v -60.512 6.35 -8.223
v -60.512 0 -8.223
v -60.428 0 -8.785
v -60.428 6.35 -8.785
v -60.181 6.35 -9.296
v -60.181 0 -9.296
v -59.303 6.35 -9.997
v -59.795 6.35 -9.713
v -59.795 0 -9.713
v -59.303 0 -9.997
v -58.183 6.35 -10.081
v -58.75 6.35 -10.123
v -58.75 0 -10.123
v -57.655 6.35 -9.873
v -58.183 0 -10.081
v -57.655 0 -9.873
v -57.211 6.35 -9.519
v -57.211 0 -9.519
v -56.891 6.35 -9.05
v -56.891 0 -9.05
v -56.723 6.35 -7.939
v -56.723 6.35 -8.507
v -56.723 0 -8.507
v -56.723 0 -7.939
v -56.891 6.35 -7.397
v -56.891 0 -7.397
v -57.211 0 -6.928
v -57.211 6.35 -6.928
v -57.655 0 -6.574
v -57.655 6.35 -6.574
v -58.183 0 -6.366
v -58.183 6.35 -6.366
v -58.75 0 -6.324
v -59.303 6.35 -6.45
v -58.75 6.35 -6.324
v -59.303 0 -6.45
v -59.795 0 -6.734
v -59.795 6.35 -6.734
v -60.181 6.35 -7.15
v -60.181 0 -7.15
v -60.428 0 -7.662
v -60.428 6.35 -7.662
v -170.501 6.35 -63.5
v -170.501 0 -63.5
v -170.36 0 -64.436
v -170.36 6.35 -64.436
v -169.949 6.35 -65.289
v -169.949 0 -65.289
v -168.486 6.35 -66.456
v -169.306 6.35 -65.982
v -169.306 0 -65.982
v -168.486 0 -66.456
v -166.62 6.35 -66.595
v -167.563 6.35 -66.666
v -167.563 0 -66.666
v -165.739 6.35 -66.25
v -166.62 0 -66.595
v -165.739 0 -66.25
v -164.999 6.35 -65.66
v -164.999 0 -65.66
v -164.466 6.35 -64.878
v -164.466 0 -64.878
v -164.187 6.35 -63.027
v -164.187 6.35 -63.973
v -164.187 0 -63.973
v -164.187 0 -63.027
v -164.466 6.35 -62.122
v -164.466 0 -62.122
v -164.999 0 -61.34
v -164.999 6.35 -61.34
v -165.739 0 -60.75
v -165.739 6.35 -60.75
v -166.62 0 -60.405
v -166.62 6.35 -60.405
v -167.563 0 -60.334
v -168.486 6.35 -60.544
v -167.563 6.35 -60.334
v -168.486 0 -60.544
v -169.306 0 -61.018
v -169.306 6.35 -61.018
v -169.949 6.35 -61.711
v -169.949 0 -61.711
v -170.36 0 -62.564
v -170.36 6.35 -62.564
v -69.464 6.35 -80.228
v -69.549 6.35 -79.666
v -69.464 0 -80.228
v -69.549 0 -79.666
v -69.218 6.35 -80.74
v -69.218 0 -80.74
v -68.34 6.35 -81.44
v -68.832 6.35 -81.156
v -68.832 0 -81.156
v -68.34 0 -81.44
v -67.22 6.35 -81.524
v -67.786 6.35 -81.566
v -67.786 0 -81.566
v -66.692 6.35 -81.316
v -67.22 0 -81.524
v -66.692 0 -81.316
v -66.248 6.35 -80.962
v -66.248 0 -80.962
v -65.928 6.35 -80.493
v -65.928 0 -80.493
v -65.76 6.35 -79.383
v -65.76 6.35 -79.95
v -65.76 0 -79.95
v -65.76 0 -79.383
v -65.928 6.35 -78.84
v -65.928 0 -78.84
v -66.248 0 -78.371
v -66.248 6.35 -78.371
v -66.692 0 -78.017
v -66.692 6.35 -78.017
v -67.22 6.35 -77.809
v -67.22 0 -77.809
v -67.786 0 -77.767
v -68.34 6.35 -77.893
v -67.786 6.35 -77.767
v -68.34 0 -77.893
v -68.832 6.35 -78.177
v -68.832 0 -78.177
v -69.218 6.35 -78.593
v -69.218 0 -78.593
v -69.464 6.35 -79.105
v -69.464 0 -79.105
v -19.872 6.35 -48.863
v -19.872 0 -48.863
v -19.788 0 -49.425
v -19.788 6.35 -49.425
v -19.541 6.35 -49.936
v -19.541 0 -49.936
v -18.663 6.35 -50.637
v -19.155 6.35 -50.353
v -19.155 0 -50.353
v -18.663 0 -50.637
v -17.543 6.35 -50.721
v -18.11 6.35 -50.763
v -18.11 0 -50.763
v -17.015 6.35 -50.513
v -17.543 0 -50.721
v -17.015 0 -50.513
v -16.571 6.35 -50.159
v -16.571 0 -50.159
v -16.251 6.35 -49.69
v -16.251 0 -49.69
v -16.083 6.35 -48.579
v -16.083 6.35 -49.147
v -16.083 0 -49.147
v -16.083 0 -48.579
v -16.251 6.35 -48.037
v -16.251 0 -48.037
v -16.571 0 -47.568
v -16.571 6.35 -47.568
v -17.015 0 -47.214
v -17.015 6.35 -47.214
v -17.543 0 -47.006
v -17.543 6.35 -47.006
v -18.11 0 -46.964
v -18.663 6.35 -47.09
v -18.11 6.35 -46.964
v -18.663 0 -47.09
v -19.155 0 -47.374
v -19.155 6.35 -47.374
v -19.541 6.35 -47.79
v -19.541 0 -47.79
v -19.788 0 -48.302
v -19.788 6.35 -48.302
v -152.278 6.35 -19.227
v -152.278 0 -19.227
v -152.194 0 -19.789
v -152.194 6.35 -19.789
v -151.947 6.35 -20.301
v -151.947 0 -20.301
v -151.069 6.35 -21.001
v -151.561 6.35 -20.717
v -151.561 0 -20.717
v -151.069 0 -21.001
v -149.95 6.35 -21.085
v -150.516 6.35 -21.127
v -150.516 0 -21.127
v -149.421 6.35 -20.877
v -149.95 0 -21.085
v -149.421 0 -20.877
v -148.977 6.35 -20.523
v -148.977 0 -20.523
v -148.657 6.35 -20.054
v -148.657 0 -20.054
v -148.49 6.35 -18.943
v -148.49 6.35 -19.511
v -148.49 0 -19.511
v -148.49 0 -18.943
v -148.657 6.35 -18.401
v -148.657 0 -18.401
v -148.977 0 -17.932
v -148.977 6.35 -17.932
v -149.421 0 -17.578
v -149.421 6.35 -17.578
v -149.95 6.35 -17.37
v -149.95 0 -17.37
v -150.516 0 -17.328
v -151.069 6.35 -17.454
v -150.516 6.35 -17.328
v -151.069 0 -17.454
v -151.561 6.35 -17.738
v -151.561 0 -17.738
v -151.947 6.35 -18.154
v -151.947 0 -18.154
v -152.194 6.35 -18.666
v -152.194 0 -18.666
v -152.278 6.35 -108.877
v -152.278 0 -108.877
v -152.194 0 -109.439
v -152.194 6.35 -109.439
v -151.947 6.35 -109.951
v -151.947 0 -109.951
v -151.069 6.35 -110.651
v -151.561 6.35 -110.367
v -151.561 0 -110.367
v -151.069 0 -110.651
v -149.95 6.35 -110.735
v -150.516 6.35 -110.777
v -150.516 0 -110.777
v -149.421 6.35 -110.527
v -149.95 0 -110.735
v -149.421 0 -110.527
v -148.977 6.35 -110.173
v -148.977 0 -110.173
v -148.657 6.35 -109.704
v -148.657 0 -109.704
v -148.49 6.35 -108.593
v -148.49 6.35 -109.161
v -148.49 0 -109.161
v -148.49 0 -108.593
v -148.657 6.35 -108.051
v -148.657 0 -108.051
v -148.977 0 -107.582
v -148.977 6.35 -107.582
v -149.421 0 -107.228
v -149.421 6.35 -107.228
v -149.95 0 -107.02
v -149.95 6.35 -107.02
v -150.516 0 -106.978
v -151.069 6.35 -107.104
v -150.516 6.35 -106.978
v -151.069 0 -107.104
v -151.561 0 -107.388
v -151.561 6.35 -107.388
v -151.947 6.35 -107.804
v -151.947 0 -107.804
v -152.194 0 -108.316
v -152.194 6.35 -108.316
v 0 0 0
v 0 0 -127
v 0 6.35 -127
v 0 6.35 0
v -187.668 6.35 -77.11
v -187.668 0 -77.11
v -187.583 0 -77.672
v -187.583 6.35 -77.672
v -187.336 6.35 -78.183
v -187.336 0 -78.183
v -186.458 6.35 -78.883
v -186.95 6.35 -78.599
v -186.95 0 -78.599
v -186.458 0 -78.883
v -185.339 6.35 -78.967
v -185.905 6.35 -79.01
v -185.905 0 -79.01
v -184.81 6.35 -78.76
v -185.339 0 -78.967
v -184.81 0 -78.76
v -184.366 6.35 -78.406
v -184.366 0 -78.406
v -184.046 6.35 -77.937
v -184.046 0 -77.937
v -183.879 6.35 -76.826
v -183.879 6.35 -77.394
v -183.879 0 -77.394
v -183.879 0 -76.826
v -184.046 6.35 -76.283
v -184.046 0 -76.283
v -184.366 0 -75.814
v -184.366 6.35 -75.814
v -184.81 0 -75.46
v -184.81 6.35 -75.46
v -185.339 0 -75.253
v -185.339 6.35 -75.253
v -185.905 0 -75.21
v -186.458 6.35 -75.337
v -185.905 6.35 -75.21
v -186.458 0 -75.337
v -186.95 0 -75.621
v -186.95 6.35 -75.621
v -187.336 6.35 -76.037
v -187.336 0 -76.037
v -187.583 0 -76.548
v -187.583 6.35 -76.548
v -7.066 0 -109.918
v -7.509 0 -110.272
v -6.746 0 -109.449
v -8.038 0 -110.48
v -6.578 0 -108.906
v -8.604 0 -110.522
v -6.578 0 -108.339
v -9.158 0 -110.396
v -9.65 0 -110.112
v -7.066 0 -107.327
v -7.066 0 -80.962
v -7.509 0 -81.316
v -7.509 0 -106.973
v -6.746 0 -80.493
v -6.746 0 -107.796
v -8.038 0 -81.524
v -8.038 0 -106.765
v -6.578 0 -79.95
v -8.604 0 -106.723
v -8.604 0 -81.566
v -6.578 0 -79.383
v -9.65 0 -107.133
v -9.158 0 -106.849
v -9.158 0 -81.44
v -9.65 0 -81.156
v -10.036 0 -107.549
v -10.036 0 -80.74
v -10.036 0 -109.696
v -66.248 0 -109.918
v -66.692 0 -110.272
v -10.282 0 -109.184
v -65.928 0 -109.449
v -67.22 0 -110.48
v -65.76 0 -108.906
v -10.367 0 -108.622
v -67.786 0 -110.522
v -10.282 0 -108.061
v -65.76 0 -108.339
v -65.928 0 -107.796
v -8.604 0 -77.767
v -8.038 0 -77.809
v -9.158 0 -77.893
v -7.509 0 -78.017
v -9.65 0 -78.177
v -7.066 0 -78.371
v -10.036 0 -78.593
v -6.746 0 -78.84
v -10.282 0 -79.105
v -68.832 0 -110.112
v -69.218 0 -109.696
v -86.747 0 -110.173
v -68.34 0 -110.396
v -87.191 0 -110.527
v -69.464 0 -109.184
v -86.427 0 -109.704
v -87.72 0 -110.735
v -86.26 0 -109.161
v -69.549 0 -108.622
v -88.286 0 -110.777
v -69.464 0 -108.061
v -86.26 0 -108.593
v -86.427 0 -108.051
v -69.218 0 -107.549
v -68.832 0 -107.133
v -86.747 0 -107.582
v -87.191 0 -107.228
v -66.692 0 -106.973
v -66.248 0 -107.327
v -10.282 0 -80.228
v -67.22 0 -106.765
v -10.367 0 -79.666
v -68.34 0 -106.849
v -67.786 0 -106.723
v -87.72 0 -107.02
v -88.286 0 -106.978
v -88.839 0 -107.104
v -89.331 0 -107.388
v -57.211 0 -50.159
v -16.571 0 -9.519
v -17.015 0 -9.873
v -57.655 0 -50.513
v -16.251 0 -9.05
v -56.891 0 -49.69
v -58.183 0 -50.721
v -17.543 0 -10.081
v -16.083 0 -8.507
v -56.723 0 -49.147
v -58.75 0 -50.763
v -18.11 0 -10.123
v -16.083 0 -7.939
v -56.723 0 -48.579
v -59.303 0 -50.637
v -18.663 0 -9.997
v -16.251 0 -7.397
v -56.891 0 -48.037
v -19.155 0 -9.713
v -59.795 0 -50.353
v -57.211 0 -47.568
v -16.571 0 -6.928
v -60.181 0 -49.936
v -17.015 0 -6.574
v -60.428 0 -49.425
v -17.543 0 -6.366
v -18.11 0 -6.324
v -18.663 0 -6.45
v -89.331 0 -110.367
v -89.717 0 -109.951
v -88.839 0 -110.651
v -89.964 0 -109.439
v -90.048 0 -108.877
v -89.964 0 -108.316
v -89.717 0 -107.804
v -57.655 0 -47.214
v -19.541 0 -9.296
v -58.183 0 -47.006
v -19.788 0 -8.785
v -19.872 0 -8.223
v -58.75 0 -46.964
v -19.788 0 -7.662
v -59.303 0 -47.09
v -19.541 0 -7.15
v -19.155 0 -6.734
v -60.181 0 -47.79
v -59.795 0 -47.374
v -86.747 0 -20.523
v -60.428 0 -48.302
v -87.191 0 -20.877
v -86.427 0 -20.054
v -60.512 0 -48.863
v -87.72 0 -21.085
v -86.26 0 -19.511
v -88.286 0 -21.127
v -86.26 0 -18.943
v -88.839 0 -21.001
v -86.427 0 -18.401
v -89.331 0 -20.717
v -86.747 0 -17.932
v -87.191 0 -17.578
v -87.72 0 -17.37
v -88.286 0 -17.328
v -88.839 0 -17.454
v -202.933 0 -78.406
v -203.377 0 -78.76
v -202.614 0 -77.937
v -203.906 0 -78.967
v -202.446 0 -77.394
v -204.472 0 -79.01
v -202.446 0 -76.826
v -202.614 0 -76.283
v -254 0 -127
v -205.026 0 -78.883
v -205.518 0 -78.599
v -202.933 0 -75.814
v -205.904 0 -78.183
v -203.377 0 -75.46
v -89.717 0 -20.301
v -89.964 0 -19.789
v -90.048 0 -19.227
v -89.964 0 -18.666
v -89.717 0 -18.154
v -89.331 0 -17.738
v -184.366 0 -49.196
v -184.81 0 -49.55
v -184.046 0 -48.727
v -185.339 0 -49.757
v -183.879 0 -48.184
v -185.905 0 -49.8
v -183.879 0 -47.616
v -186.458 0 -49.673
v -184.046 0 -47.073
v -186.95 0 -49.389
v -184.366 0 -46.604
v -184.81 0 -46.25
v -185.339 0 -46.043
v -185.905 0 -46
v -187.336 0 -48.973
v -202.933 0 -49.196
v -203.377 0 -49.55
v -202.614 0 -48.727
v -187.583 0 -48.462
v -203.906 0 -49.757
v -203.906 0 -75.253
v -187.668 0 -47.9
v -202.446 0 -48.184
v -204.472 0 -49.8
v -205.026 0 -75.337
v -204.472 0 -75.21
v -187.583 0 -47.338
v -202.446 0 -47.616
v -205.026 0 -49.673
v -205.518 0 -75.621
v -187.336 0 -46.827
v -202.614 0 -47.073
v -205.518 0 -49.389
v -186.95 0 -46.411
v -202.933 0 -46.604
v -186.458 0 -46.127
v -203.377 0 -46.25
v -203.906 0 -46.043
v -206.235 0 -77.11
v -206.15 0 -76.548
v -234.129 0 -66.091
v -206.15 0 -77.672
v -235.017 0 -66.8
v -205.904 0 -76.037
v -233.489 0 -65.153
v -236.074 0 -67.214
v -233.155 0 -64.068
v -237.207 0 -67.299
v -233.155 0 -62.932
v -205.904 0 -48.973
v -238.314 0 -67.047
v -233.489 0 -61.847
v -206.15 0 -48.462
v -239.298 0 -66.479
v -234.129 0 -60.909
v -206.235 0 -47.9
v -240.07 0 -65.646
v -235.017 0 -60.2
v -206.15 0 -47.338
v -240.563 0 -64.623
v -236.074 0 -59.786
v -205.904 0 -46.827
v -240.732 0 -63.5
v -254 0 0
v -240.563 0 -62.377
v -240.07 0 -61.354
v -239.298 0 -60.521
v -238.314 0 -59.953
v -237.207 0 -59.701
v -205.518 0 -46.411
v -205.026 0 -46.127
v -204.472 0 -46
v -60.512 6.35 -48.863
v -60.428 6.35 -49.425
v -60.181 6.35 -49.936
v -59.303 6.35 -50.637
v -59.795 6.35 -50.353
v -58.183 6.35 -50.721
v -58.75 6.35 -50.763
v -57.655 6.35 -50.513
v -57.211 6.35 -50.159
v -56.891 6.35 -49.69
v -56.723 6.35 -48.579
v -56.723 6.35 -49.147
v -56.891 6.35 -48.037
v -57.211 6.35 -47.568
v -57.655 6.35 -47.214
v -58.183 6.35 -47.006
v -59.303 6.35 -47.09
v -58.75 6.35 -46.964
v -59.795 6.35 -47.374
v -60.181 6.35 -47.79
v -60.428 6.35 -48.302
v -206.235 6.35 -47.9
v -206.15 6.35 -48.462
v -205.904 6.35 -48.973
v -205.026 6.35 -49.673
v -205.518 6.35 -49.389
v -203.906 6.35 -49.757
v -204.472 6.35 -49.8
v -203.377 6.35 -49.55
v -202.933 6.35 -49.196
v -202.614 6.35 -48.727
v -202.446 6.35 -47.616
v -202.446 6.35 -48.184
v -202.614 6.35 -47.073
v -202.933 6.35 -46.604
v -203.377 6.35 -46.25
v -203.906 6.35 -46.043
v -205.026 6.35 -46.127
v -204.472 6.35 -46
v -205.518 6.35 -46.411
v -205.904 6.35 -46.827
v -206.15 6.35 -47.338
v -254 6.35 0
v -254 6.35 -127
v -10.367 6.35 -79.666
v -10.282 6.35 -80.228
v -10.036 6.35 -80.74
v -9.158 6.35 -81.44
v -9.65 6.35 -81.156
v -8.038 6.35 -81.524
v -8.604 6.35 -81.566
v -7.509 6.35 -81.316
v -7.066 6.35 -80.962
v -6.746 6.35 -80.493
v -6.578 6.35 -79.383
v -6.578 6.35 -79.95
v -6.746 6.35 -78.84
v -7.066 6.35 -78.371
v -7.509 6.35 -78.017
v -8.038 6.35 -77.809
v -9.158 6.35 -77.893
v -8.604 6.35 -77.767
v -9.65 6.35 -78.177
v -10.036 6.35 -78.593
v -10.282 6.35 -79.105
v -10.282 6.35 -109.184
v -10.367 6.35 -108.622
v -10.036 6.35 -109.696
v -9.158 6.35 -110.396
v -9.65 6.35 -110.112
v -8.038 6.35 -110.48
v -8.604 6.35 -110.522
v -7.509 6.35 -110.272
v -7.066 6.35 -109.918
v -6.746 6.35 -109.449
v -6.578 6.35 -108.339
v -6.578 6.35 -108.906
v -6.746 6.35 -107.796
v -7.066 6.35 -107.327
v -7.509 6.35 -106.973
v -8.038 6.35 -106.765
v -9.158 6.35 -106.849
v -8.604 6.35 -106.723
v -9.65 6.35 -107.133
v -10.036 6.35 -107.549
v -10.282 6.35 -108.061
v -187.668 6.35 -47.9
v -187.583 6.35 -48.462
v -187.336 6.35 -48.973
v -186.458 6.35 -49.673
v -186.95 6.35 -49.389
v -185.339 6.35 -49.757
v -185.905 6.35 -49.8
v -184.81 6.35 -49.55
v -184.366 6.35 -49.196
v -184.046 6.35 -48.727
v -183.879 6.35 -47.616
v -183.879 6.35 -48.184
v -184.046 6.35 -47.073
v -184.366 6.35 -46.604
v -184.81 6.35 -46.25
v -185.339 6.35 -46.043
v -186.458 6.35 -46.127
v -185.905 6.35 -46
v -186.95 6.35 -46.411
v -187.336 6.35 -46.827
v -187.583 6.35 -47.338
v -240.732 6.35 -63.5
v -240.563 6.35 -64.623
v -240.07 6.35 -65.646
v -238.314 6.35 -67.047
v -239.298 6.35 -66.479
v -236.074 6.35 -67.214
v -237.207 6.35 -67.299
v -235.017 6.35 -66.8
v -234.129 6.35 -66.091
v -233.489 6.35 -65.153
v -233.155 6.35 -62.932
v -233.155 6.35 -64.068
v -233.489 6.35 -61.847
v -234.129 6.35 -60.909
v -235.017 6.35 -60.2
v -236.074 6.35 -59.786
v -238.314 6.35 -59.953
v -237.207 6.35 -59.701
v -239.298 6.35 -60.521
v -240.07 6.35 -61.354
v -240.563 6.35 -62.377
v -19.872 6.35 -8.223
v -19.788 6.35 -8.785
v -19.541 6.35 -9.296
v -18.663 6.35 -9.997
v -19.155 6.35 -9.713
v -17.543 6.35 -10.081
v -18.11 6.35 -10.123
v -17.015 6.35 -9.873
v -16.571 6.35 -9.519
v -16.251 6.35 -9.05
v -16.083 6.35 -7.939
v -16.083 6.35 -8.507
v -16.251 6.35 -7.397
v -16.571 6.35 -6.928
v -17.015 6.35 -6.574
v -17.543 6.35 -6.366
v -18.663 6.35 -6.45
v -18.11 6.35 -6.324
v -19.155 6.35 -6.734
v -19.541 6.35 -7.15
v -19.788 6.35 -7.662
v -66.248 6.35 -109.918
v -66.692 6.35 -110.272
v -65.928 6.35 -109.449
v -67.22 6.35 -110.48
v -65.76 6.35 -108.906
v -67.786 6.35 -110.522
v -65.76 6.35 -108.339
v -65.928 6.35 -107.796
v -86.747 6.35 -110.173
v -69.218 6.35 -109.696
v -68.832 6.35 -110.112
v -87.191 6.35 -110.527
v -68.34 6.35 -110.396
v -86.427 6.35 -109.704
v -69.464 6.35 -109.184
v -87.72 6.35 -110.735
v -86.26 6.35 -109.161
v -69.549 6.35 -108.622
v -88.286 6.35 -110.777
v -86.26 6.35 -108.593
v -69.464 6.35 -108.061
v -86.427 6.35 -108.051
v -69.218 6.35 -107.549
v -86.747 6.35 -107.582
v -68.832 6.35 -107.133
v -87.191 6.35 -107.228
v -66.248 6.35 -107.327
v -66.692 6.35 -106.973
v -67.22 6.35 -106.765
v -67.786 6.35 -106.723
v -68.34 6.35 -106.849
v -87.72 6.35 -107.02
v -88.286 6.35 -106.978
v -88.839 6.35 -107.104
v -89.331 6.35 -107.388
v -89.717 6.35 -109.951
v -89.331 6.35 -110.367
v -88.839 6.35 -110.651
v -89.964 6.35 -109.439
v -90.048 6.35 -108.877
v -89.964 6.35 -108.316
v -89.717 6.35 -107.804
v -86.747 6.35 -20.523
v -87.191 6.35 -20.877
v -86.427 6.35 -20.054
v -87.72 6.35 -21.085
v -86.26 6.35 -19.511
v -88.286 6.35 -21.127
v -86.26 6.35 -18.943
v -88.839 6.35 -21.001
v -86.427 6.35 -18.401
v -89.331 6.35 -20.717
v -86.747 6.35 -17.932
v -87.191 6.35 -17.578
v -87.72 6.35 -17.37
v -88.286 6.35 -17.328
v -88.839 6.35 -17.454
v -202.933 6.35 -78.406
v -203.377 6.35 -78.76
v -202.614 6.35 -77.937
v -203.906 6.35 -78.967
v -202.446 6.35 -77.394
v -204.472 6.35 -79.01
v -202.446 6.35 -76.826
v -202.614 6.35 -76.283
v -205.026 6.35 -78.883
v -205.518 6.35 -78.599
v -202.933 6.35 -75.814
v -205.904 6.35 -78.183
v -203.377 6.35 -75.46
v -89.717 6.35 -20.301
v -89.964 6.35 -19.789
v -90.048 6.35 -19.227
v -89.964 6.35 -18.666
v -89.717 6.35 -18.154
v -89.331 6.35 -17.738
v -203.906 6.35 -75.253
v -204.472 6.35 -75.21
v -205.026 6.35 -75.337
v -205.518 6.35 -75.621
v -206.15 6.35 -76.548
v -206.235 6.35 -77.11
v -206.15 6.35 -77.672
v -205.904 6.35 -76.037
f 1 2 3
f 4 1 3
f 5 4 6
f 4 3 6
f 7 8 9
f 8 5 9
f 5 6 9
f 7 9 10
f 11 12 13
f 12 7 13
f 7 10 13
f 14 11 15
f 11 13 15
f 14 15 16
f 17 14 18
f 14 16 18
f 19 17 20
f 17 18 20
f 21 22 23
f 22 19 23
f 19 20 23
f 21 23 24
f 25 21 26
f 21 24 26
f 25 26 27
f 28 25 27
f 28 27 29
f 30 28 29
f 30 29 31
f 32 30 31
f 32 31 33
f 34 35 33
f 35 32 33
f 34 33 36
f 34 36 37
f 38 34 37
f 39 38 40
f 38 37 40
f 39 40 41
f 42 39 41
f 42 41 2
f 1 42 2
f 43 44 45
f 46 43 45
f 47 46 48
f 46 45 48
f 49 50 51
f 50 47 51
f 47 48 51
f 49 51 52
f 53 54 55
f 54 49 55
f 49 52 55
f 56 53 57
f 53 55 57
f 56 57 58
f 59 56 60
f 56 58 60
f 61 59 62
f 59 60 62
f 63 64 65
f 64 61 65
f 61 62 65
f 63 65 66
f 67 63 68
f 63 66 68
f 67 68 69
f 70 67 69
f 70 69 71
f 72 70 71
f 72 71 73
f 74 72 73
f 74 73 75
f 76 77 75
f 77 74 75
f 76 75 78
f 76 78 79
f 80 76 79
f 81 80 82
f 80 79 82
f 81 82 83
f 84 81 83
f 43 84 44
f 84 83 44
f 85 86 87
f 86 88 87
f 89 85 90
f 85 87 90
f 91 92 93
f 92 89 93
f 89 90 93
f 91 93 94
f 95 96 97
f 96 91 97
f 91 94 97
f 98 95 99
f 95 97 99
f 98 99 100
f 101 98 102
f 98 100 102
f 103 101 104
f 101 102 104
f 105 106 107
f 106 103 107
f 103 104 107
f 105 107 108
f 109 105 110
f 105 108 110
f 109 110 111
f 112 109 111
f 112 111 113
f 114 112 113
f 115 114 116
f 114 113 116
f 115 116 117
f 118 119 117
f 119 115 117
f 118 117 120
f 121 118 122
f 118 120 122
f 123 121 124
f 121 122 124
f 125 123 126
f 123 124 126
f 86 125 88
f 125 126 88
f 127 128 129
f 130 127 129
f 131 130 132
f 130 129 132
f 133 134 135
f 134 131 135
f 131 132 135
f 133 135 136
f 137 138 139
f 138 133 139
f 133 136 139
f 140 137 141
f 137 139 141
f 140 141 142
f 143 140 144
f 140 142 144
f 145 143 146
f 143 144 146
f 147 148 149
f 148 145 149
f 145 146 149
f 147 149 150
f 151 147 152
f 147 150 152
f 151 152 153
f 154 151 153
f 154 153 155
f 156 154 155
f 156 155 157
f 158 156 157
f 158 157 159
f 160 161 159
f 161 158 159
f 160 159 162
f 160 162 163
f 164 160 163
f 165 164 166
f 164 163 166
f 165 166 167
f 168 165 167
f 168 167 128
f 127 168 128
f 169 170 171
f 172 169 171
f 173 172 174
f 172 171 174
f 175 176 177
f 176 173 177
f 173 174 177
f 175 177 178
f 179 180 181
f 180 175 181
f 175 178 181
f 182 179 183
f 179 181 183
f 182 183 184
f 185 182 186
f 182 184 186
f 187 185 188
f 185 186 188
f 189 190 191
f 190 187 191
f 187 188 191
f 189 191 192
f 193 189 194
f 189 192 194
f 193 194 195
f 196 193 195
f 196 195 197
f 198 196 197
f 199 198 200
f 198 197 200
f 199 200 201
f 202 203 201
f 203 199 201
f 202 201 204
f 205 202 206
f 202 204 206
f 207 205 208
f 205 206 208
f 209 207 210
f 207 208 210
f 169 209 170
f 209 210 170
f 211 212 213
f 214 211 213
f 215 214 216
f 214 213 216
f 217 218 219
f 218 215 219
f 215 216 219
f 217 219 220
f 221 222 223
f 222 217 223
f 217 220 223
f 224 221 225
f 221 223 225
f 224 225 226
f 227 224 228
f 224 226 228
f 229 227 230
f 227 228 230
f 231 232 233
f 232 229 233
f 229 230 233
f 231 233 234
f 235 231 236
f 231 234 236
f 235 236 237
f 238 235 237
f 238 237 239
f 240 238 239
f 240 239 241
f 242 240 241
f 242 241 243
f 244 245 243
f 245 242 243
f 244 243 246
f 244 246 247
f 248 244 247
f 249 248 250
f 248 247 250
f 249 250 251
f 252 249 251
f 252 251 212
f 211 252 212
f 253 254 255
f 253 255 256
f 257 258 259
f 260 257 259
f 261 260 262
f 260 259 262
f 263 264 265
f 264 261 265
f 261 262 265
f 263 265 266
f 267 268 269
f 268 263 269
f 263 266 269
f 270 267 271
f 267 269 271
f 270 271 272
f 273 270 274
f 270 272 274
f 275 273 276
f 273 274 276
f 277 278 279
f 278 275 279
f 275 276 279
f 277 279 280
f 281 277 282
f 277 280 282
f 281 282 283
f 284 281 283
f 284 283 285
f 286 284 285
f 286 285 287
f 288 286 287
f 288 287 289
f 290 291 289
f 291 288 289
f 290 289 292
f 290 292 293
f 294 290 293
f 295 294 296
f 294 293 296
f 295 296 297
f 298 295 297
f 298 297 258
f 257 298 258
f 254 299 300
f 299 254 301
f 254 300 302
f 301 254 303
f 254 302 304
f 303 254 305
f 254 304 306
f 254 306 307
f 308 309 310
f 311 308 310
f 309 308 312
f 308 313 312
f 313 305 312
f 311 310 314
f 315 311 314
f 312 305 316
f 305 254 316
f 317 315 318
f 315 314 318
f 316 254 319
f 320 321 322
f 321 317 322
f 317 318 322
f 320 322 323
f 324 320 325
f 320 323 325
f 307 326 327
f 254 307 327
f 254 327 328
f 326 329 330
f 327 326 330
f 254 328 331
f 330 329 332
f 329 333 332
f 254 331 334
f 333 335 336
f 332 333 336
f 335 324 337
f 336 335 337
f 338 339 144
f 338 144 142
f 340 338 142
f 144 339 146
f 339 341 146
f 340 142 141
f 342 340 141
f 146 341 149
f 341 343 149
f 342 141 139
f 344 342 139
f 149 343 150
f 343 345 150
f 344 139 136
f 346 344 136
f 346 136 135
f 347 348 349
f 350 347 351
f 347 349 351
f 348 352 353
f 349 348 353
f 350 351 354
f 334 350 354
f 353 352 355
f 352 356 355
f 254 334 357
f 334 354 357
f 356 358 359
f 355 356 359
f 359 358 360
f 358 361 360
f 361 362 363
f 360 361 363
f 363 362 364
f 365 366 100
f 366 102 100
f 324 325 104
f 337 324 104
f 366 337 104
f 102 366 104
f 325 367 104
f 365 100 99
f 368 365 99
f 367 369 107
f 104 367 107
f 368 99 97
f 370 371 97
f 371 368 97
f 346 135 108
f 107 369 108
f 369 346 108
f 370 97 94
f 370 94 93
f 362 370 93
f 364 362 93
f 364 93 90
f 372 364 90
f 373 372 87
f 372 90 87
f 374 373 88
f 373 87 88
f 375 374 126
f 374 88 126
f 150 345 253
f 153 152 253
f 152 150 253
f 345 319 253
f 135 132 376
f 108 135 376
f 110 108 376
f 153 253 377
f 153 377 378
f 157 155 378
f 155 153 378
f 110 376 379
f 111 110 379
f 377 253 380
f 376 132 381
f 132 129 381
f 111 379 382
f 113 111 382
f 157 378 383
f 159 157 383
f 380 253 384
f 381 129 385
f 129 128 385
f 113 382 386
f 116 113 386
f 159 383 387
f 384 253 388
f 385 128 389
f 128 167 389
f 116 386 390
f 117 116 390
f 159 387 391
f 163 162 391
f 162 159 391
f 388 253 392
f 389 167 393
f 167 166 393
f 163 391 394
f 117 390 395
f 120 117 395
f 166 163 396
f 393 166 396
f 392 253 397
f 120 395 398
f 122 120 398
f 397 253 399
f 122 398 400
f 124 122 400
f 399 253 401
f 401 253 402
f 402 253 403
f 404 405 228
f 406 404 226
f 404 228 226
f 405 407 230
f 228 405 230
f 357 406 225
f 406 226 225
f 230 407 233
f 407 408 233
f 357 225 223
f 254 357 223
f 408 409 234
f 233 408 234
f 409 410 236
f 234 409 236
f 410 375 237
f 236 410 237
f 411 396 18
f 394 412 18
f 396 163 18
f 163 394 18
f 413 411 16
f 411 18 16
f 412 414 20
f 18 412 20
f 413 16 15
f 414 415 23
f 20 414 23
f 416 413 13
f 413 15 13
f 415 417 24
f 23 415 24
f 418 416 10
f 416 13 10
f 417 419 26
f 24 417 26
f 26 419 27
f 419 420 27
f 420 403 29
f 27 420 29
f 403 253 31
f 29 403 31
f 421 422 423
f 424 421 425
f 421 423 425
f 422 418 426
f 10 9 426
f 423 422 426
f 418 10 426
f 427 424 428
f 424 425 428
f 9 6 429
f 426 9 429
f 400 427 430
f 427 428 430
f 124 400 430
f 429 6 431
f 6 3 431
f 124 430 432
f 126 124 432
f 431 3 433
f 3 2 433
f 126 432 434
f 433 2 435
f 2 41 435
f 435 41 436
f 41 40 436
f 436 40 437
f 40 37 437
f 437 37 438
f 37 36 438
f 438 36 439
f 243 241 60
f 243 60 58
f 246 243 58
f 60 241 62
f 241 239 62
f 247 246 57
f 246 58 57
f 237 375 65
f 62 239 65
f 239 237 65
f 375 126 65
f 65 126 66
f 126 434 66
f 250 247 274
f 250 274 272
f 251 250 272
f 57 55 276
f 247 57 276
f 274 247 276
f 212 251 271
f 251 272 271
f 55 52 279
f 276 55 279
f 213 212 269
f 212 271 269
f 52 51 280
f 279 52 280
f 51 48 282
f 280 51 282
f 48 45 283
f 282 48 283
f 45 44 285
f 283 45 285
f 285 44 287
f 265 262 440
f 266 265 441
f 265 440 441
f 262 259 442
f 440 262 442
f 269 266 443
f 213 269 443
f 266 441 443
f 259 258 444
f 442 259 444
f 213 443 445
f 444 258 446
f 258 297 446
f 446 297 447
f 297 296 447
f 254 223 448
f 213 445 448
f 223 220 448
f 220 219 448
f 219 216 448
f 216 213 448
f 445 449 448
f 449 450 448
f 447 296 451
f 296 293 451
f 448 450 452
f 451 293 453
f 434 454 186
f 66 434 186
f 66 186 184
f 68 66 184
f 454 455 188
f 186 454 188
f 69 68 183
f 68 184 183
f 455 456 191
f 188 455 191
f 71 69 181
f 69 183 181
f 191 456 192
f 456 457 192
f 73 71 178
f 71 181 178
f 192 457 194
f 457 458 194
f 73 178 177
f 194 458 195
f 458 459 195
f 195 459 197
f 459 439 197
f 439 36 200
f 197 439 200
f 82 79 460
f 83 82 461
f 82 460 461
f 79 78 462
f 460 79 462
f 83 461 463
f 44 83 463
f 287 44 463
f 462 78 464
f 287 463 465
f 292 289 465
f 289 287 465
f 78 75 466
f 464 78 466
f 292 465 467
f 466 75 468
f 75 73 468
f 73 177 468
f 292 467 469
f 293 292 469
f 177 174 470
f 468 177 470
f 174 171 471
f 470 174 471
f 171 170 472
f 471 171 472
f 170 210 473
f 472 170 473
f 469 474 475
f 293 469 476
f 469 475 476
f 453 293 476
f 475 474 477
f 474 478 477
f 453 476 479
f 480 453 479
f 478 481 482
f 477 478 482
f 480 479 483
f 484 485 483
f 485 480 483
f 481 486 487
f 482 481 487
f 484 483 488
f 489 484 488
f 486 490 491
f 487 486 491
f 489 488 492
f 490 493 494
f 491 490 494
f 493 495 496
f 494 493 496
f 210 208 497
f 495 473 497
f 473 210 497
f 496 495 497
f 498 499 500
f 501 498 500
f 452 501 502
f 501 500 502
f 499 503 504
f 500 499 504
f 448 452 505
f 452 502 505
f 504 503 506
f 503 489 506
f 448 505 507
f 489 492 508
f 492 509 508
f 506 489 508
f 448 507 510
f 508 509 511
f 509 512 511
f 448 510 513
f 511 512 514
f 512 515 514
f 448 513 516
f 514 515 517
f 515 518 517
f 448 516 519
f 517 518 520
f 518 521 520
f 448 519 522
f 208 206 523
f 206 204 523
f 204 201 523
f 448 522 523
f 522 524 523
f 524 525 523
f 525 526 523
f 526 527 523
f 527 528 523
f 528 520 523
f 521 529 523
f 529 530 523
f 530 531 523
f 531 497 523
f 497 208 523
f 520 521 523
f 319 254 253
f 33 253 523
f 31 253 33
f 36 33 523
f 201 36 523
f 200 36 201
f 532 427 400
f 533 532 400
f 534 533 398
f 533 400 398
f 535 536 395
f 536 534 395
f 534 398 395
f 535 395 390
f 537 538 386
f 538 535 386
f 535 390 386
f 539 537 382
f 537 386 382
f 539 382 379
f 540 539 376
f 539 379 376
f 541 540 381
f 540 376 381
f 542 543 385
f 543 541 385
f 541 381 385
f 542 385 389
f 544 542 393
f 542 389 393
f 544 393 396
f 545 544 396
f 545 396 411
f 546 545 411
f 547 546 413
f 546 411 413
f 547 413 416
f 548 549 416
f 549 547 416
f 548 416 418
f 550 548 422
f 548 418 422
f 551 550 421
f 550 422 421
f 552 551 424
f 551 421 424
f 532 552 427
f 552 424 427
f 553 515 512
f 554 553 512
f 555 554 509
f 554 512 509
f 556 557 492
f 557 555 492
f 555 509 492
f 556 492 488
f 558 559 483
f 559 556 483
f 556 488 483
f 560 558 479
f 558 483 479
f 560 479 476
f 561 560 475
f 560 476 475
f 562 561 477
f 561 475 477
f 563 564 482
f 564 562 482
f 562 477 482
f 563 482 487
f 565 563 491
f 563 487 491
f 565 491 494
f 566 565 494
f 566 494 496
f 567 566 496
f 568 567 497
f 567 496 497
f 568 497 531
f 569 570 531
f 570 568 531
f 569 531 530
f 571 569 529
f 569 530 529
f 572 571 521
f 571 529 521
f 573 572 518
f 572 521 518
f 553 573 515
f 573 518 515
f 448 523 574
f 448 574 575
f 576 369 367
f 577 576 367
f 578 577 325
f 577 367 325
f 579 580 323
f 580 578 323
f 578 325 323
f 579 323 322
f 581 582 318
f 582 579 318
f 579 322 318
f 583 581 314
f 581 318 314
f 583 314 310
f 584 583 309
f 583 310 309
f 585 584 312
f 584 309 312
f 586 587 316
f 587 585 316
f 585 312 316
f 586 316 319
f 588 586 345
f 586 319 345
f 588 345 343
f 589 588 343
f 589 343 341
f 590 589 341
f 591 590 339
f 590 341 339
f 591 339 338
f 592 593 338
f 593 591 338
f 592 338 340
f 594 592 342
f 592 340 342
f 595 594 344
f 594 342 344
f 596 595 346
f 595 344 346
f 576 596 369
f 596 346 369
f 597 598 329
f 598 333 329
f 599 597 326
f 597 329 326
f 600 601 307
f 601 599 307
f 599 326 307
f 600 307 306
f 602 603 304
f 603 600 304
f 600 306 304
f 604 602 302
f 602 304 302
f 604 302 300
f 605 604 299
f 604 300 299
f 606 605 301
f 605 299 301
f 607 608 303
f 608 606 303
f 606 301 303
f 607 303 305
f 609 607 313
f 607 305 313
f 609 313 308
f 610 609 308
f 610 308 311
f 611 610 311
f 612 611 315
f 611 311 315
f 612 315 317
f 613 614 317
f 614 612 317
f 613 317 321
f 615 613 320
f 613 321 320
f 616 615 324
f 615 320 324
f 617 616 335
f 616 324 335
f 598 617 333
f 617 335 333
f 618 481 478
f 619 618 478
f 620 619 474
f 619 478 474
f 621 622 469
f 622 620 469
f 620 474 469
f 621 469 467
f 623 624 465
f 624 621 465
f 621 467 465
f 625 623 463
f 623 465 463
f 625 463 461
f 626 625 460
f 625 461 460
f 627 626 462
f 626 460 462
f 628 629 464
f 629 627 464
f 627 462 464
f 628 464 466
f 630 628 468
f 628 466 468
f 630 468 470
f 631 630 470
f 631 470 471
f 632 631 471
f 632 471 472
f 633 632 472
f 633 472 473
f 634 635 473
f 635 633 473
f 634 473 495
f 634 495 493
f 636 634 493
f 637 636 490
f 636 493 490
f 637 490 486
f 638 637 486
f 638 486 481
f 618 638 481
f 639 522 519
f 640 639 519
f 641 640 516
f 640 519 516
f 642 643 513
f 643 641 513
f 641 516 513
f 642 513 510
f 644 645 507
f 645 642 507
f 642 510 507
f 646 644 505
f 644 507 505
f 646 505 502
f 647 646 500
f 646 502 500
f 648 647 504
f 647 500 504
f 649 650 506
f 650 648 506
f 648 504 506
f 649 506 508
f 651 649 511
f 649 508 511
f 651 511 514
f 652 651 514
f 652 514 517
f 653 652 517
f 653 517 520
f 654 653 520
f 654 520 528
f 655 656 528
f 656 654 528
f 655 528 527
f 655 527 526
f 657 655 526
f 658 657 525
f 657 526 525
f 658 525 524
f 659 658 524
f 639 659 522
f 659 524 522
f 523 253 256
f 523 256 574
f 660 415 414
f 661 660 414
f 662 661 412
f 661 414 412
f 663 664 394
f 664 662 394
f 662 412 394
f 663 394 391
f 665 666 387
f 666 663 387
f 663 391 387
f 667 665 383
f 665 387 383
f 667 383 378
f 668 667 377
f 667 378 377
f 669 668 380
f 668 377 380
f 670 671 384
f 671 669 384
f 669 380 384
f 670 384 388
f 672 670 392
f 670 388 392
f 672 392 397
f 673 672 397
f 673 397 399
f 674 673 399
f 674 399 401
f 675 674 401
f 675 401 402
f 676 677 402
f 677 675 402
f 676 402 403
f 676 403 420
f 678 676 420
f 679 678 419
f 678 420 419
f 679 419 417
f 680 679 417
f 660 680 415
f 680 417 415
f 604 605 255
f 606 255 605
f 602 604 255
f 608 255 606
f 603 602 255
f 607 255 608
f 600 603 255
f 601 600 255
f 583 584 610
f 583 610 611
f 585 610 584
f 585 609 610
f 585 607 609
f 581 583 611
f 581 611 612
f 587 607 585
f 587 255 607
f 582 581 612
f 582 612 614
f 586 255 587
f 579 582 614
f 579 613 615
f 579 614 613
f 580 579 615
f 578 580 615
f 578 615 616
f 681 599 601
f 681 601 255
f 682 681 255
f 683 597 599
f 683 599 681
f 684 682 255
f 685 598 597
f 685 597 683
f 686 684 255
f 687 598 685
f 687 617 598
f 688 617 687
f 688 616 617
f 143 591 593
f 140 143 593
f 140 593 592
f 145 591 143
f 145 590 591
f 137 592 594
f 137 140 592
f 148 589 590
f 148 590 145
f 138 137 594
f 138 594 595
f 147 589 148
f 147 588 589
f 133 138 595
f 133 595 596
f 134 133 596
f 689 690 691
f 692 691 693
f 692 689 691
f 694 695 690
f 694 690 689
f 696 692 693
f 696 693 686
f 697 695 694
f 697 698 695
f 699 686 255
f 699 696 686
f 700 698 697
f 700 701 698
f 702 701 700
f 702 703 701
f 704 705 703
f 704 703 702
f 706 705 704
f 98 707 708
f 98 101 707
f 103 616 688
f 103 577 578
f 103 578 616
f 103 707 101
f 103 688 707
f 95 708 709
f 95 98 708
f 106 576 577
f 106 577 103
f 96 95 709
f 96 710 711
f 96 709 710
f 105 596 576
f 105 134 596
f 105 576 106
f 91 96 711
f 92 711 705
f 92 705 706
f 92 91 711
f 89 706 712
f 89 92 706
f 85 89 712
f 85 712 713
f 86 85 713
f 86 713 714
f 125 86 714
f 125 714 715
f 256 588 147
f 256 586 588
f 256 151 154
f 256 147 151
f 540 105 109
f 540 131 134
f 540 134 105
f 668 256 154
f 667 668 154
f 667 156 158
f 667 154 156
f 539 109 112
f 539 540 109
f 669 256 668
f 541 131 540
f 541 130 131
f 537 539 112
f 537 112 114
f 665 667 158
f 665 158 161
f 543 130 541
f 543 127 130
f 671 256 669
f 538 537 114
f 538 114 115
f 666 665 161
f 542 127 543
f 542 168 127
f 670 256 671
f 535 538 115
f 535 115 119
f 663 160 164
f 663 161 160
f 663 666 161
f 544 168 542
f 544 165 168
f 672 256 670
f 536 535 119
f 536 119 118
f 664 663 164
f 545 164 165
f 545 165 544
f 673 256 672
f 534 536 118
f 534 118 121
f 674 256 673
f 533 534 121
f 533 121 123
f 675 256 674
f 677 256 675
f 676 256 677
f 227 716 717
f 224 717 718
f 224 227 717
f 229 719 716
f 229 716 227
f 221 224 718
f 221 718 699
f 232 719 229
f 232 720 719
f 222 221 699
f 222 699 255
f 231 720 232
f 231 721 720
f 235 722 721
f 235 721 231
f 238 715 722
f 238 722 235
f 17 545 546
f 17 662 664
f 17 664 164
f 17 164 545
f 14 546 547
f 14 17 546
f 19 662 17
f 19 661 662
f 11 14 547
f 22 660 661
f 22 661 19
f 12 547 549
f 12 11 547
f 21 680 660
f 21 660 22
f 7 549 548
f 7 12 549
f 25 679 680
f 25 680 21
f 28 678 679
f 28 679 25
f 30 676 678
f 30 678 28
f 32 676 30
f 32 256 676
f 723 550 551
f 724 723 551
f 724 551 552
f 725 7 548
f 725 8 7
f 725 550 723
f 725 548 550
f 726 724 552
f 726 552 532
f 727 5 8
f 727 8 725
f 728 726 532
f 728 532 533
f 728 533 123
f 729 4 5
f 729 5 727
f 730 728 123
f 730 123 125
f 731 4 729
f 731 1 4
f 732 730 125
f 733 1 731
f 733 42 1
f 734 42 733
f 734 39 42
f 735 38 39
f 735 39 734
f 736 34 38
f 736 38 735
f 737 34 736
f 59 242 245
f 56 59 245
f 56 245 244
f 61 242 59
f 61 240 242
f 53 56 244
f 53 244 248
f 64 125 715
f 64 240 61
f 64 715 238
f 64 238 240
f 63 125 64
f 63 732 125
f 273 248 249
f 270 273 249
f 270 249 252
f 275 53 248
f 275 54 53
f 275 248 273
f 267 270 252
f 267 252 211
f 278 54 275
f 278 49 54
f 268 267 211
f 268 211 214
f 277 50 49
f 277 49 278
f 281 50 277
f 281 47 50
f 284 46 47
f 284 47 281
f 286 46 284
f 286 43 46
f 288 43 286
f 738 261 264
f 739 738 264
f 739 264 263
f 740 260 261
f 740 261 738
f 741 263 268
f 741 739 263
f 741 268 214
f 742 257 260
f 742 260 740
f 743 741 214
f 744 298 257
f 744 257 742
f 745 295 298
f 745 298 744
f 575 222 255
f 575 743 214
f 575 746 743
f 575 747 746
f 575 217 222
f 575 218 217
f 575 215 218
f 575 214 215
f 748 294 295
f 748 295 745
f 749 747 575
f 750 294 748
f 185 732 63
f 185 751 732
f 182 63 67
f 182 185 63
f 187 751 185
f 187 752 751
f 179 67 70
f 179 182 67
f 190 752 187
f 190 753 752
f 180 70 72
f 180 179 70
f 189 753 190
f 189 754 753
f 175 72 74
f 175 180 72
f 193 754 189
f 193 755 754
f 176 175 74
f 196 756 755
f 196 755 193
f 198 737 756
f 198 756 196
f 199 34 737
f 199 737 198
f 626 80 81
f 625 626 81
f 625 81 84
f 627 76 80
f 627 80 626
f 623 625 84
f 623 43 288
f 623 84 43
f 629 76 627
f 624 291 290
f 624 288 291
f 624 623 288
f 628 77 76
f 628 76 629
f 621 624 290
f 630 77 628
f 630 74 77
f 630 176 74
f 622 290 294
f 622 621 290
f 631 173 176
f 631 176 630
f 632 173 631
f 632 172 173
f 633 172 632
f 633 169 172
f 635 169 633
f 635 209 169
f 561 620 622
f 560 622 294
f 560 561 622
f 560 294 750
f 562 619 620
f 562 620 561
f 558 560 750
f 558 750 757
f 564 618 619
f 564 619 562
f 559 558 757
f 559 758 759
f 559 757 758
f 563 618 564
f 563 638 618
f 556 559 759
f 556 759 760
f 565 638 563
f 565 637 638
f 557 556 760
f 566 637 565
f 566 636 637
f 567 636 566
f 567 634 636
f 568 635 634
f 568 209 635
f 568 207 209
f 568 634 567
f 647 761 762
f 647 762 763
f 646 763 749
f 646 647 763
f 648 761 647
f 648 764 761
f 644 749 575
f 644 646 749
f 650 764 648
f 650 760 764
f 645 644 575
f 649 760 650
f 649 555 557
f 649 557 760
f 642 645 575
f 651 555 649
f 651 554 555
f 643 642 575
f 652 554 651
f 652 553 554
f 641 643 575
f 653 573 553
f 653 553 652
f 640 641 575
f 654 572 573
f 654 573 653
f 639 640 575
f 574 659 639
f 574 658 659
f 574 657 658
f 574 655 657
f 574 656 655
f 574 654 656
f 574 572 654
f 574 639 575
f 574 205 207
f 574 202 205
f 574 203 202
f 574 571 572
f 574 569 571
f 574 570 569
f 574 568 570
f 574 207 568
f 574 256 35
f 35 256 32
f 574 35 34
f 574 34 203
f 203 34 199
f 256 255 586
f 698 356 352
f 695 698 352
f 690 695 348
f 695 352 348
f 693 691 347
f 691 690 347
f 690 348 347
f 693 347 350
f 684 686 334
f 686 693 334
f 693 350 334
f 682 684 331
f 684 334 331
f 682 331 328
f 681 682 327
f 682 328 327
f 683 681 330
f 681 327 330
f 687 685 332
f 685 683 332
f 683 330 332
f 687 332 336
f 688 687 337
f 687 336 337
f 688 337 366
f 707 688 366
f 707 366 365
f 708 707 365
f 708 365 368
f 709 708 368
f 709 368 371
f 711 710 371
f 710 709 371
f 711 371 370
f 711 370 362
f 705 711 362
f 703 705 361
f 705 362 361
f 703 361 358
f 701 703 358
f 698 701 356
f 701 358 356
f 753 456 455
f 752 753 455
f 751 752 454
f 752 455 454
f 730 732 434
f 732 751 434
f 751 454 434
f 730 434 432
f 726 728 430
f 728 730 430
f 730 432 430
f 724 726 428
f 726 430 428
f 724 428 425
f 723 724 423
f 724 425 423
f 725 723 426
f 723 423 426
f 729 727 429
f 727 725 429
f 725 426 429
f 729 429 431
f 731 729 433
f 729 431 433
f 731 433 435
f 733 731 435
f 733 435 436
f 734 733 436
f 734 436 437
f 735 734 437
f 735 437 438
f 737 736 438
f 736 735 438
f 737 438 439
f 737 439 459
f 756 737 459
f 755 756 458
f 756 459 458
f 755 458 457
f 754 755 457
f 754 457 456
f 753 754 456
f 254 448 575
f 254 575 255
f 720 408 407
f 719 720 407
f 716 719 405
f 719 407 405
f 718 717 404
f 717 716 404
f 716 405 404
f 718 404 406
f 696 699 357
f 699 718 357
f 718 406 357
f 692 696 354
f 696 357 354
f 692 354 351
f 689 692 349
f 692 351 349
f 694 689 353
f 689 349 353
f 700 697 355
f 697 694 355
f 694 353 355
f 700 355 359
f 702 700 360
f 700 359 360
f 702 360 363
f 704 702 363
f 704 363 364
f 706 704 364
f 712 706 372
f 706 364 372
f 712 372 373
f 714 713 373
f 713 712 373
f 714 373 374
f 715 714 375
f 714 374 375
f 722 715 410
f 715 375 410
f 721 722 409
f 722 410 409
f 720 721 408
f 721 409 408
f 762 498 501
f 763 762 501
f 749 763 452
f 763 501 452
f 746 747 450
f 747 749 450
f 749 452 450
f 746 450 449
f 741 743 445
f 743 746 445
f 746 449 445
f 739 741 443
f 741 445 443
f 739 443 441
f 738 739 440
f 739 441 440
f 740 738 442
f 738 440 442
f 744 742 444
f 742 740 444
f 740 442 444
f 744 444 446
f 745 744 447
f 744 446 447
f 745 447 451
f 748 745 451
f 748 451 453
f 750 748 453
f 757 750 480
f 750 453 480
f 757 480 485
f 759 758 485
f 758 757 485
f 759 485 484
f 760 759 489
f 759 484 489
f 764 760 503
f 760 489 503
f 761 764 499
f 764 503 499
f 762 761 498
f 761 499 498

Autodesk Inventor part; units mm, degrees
ref_plane "YZ Plane" through (0, 0, 0) normal (1, 0, 0) x (0, 1, 0)
ref_plane "XZ Plane" through (0, 0, 0) normal (0, 1, 0) x (-1, 0, 0)
ref_plane "XY Plane" through (0, 0, 0) normal (0, 0, 1) x (1, 0, 0)
sketch "Sketch1" plane through (0, 0, 0) normal (0, 1, 0) x (-1, 0, 0)
  line L0 (0, 0) -> (254, 0)
  line L1 (254, 0) -> (254, -127)
  line L2 (254, -127) -> (0, -127)
  line L3 (0, -127) -> (0, 0)
  circle A0 centre (17.9672, -8.2233) radius 1.905
  circle A1 centre (17.9672, -48.8633) radius 1.905
  circle A2 centre (58.6072, -48.8633) radius 1.905
  circle A3 centre (58.6072, -8.2233) radius 1.905
  circle A4 centre (67.644, -79.6665) radius 1.905
  circle A5 centre (67.644, -108.6225) radius 1.905
  circle A6 centre (8.462, -79.6665) radius 1.905
  circle A7 centre (8.462, -108.6225) radius 1.905
  circle A8 centre (236.9221, -63.5) radius 3.81
  circle A9 centre (167.3261, -63.5) radius 3.175
  circle A10 centre (150.3735, -19.2274) radius 1.905
  circle A11 centre (150.3735, -108.8774) radius 1.905
  circle A12 centre (88.1435, -108.8774) radius 1.905
  circle A13 centre (88.1435, -19.2274) radius 1.905
  circle A14 centre (204.3299, -47.9) radius 1.905
  circle A15 centre (204.3299, -77.11) radius 1.905
  circle A16 centre (185.7625, -77.11) radius 1.905
  circle A17 centre (185.7625, -47.9) radius 1.905
  dimension "d0" = 254
  dimension "d1" = 127
  dimension "d2" = 3.81
  dimension "d3" = 3.81
  dimension "d4" = 3.81
  dimension "d5" = 3.81
  dimension "d6" = 40.64
  dimension "d7" = 40.64
  dimension "d8" = 40.64
  dimension "d9" = 40.64
  dimension "d14" = 3.81
  dimension "d15" = 3.81
  dimension "d16" = 3.81
  dimension "d17" = 3.81
  dimension "d18" = 7.62
  dimension "d19" = 63.5
  dimension "d20" = 6.35
  dimension "d21" = 69.596
  dimension "d22" = 63.5
  dimension "d25" = 3.81
  dimension "d26" = 3.81
  dimension "d27" = 3.81
  dimension "d28" = 3.81
  dimension "d31" = 3.81
  dimension "d32" = 3.81
  dimension "d33" = 3.81
  dimension "d34" = 3.81
extrude "Extrusion1" add sketch "Sketch1" along normal blind 6.35
properties part number "BaseBoard"
